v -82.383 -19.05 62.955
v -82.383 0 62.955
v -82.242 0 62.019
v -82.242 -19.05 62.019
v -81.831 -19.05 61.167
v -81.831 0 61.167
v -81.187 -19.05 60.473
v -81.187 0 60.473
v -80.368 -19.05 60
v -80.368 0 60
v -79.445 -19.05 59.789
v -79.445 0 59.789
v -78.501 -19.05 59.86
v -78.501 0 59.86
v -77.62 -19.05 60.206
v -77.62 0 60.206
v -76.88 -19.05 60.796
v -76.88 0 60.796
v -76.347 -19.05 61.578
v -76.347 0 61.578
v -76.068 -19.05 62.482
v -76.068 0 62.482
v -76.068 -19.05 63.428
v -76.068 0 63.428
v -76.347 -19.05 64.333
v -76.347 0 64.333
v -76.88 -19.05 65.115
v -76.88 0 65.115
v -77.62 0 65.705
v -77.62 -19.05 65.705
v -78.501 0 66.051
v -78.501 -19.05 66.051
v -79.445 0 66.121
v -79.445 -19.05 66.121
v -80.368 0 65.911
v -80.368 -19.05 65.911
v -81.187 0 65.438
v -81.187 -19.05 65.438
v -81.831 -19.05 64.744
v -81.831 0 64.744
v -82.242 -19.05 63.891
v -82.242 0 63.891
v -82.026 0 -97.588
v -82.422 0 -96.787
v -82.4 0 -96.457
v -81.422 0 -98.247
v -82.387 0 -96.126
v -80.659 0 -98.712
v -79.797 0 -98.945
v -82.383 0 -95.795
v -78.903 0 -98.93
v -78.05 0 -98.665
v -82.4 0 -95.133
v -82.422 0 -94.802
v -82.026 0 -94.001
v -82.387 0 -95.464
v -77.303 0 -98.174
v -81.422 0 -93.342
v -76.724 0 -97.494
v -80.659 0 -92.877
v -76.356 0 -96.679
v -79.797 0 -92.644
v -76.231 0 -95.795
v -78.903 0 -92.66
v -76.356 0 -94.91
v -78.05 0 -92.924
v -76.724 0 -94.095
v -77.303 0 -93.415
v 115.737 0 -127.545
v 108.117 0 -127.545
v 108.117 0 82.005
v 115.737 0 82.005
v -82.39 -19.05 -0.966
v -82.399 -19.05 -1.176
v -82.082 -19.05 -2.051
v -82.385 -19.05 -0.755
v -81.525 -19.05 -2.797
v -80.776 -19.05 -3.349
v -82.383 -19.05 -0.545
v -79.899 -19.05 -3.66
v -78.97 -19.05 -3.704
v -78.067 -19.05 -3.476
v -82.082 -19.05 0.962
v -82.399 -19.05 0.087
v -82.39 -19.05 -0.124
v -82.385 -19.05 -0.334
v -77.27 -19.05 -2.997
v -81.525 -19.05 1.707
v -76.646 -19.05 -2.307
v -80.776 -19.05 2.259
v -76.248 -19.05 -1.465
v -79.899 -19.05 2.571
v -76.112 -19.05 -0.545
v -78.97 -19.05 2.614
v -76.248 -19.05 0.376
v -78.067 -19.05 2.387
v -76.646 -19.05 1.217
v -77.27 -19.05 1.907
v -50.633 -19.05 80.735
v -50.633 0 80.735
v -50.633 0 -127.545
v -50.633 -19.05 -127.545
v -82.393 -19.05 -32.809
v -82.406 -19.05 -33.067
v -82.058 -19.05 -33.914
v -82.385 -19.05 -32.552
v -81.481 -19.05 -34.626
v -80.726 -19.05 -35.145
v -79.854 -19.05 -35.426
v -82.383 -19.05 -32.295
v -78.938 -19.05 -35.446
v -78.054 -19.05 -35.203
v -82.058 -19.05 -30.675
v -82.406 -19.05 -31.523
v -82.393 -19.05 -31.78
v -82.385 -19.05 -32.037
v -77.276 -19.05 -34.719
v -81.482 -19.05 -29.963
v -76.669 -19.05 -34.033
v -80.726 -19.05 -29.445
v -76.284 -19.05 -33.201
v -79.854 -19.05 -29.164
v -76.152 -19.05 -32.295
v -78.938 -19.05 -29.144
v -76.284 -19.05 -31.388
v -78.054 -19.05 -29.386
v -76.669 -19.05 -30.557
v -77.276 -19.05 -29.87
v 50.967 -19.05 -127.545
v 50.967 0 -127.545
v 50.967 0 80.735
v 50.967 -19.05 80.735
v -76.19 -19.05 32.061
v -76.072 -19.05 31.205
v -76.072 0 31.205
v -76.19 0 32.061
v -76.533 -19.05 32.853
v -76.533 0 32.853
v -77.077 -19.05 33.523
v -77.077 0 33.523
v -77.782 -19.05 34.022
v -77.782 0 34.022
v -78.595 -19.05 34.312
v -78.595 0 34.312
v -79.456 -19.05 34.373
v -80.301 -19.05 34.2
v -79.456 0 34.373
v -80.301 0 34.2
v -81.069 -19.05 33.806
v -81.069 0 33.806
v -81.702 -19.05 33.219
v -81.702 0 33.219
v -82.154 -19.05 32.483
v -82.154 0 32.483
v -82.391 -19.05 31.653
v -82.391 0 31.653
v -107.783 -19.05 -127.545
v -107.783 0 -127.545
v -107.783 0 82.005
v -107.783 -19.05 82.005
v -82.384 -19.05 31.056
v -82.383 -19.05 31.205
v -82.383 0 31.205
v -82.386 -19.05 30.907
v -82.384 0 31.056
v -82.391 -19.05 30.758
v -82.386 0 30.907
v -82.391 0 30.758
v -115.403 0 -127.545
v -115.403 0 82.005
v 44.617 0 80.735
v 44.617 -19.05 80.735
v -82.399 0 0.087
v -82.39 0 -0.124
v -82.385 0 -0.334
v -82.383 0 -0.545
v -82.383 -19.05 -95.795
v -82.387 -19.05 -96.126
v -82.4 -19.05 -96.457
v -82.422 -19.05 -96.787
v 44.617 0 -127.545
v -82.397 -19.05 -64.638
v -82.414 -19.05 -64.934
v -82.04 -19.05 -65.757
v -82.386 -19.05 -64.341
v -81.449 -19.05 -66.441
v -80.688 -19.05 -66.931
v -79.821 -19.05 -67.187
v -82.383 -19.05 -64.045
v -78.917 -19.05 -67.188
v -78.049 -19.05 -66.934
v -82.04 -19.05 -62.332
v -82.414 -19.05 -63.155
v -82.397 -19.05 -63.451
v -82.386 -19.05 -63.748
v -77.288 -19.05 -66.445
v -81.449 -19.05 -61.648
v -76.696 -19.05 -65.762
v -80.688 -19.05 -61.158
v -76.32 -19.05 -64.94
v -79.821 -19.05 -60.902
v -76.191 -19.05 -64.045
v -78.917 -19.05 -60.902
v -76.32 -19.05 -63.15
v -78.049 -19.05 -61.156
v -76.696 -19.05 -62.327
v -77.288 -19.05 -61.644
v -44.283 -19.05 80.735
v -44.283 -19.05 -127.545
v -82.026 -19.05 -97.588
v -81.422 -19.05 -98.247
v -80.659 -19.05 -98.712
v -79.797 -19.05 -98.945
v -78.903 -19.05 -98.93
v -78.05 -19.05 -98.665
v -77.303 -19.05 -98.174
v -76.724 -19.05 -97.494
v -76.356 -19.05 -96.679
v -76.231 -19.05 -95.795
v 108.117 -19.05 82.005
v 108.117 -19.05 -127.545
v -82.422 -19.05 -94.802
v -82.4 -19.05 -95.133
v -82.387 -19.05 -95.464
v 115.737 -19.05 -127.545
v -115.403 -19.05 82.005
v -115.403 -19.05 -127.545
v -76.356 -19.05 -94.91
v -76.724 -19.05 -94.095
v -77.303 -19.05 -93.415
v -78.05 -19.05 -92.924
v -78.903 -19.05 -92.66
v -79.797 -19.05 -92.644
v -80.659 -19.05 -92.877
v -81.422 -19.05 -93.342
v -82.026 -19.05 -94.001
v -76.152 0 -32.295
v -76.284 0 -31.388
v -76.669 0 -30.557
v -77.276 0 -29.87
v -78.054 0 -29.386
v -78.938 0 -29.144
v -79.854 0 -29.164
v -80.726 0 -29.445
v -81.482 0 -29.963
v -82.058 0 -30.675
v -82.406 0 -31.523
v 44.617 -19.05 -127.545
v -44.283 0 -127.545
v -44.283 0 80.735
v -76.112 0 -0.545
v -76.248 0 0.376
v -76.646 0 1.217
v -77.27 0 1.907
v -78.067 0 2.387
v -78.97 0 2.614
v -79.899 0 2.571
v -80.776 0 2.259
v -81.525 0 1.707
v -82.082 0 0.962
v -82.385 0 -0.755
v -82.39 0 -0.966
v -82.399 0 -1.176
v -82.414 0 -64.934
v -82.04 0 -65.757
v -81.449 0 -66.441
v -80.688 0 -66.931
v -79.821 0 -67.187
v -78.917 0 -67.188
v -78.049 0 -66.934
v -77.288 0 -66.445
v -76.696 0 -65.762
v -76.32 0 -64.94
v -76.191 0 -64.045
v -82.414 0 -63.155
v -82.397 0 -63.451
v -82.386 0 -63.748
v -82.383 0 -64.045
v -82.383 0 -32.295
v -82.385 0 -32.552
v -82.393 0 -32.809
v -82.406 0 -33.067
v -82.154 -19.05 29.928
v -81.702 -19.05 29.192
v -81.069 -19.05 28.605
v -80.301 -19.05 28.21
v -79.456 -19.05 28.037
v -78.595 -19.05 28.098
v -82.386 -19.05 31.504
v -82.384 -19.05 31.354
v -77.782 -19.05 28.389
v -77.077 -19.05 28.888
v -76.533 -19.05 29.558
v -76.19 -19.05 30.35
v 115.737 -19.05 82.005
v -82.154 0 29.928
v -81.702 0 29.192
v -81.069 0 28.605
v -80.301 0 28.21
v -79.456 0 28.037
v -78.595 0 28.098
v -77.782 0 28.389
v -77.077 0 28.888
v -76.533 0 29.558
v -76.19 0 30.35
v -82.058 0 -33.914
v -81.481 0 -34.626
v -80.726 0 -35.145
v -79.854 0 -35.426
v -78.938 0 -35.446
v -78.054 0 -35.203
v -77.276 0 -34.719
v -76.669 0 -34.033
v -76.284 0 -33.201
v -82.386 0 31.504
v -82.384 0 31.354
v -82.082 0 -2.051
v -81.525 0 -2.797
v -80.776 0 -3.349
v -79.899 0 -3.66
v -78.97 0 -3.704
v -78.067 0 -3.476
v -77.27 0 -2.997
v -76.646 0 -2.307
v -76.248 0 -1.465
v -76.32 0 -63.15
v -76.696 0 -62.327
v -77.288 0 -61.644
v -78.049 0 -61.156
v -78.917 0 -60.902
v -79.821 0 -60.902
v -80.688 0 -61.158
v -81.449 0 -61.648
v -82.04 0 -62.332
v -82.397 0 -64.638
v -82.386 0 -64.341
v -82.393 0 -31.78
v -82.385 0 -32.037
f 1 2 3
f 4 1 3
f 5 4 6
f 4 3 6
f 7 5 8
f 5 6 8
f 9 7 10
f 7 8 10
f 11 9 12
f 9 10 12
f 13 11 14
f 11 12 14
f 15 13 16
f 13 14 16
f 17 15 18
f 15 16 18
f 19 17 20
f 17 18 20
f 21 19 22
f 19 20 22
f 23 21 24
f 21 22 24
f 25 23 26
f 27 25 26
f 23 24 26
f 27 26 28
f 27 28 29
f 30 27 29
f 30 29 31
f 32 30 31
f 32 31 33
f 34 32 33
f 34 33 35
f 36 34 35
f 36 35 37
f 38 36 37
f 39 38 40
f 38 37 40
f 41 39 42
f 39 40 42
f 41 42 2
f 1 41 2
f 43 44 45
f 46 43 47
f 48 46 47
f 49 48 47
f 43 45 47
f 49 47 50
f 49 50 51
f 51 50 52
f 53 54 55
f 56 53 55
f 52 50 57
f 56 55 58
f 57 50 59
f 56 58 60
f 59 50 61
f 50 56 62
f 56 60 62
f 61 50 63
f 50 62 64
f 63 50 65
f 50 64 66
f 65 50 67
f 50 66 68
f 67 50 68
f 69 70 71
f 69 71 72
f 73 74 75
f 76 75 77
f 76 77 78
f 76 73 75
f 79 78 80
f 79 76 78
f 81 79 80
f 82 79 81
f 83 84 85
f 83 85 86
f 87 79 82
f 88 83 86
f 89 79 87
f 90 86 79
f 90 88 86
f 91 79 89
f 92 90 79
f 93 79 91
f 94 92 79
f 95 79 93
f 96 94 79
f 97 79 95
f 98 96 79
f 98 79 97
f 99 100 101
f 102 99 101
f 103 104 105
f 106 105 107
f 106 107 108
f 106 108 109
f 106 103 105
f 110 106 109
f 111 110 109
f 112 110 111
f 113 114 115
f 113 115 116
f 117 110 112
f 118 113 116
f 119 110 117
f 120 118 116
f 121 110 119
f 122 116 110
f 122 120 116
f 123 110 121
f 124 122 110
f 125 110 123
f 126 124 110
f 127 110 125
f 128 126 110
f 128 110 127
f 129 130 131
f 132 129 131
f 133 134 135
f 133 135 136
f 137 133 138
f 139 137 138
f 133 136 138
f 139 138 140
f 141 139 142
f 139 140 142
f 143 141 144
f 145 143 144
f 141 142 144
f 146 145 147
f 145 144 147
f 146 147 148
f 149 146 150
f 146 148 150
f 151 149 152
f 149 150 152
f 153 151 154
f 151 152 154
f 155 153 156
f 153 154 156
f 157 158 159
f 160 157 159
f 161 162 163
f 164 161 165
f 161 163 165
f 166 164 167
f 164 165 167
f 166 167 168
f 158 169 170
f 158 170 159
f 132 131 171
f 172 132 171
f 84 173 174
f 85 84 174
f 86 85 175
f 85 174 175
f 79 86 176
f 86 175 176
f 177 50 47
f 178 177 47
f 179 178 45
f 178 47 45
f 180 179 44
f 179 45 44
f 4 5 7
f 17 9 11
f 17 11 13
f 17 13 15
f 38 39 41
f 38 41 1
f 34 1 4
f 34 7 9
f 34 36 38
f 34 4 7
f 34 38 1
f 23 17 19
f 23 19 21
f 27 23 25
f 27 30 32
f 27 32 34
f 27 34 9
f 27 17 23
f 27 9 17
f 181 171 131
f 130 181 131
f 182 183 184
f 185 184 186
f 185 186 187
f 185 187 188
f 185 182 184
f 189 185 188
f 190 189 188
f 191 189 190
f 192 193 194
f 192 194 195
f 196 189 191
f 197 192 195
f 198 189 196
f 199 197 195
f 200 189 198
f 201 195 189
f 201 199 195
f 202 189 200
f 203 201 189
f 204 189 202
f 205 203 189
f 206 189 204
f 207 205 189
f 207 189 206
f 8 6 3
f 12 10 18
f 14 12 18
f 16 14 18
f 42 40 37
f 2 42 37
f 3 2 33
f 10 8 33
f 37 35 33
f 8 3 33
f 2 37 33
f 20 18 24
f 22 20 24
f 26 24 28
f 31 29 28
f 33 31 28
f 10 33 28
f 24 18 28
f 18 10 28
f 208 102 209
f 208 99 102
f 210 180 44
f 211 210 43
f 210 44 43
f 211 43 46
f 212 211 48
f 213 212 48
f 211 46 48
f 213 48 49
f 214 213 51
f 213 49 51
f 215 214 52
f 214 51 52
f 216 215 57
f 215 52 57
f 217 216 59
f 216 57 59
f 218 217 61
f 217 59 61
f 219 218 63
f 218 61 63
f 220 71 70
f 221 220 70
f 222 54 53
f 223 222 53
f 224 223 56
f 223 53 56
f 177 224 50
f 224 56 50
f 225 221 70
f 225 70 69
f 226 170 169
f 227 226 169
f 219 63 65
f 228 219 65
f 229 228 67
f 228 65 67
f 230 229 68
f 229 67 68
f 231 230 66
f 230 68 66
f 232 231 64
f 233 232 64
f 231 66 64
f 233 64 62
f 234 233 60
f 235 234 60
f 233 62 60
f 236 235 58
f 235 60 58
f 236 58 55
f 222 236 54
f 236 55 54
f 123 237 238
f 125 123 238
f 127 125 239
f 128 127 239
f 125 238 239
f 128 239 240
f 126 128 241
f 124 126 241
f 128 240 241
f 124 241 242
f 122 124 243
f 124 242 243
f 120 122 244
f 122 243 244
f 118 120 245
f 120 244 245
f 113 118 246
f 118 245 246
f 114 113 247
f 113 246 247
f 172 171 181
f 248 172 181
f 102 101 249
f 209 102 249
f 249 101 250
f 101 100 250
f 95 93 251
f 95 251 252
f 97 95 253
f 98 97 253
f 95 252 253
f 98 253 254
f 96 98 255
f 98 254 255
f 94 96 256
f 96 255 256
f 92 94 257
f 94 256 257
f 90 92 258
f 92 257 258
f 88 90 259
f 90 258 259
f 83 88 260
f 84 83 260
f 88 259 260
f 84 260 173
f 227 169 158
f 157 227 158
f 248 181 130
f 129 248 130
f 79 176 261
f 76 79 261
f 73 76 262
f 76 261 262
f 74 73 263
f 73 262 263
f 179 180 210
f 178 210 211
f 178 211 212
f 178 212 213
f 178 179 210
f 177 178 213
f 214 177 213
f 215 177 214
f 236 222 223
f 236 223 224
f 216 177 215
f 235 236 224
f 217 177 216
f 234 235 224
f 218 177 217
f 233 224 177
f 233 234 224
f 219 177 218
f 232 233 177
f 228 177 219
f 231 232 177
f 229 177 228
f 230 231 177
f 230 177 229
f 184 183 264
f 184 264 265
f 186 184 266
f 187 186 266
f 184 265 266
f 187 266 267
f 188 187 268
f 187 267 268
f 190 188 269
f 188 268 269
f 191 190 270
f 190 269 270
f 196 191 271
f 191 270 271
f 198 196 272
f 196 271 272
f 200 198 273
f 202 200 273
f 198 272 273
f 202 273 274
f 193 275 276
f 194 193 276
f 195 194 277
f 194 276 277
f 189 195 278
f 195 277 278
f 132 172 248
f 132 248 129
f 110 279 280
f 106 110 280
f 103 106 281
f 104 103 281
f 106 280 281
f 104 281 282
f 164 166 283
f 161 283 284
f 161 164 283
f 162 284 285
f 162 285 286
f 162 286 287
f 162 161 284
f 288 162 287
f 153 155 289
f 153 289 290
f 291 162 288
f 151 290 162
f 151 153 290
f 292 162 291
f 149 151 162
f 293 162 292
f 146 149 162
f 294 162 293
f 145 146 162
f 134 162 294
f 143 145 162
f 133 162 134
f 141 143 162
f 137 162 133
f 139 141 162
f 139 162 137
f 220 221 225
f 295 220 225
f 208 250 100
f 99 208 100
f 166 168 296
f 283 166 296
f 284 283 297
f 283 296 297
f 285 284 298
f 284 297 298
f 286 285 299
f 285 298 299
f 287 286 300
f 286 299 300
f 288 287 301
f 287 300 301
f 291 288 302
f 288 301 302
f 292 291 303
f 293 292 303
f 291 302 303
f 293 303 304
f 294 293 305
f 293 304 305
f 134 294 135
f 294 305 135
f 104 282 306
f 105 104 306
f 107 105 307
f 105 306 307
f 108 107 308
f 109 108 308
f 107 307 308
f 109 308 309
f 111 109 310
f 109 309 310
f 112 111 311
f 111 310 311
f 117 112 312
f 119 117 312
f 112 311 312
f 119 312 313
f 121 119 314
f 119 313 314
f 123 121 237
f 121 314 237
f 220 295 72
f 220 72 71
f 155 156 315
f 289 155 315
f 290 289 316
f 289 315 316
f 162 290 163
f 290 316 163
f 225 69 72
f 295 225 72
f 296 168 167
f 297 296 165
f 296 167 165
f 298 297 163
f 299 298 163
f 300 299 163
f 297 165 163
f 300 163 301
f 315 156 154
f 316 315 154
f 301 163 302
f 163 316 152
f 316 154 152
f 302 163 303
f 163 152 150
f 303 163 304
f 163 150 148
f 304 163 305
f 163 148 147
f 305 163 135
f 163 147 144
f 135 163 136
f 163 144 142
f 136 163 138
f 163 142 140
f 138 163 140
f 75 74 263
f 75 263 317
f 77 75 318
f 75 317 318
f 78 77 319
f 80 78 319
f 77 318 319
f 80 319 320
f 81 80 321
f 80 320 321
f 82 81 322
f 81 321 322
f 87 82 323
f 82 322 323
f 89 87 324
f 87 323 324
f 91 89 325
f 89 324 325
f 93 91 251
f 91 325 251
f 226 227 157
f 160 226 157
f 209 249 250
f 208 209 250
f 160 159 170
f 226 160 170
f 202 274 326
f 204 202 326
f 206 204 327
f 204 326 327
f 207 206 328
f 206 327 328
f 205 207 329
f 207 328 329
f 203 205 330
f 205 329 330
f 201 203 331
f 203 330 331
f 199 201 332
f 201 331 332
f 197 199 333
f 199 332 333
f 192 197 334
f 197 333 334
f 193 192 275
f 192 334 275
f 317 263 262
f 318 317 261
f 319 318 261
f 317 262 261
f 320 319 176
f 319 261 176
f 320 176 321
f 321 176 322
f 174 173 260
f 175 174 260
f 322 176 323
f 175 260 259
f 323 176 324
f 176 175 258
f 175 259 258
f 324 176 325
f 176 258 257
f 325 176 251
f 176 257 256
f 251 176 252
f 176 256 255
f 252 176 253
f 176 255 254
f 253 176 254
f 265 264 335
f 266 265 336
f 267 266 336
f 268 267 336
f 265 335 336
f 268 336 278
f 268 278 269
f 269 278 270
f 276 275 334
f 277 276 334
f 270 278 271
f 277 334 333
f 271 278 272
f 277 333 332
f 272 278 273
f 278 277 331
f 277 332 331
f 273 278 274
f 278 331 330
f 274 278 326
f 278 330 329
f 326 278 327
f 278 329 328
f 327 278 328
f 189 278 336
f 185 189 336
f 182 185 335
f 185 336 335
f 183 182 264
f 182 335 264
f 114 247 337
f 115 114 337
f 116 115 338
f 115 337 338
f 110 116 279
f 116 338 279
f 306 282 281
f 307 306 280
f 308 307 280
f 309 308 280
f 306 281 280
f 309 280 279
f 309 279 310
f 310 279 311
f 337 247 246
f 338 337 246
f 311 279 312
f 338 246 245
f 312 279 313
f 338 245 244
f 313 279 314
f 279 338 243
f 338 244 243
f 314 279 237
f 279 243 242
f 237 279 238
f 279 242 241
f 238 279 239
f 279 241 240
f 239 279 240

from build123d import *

# Parameters (mm, degrees)
F1_DEPTH = 19.05


with BuildPart() as f1:
    # F0 (on Front) → F1 (new body)
    with BuildSketch(Plane.XZ):
        Polygon((108.117165637, -95.7947247652), (108.117165637, -127.5447247652), (115.737165637, -127.5447247652), (115.737165637, 82.0052752348), (108.117165637, 82.0052752348), (108.117165637, 62.9552752348), (108.117165637, 31.2052752348), (108.117165637, -0.5447247652), (108.117165637, -32.2947247652), (108.117165637, -64.0447247652), align=None)
    extrude(amount=F1_DEPTH)


with BuildPart() as f1b:
    # F0 (on Front) → F1, piece 2 (new body)
    with BuildSketch(Plane.XZ):
        Polygon((50.967165637, 31.2052752348), (50.967165637, 62.9552752348), (50.967165637, 80.7352752348), (44.617165637, 80.7352752348), (44.617165637, 62.9552752348), (44.617165637, 31.2052752348), (44.617165637, -0.5447247652), (44.617165637, -32.2947247652), (44.617165637, -64.0447247652), (44.617165637, -95.7947247652), (44.617165637, -127.5447247652), (50.967165637, -127.5447247652), (50.967165637, -95.7947247652), (50.967165637, -64.0447247652), (50.967165637, -32.2947246679), (50.967165637, -0.544724715), align=None)
    extrude(amount=F1_DEPTH)


with BuildPart() as f1c:
    # F0 (on Front) → F1, piece 3 (new body)
    with BuildSketch(Plane.XZ):
        Polygon((-50.632834363, -127.5447247652), (-44.282834363, -127.5447247652), (-44.282834363, -95.7947247051), (-44.282834363, -64.0447247652), (-44.282834363, -32.2947247652), (-44.282834363, -0.5447248178), (-44.282834363, 31.2052752348), (-44.282834363, 62.9552752348), (-44.282834363, 80.7352752348), (-50.632834363, 80.7352752348), (-50.632834363, 62.9552752348), (-50.632834363, 31.2052752348), (-50.632834363, -0.5447247652), (-50.632834363, -32.2947247652), (-50.632834363, -64.0447247652), (-50.632834363, -95.7947247652), align=None)
    extrude(amount=F1_DEPTH)


with BuildPart() as f1d:
    # F0 (on Front) → F1, piece 4 (new body)
    with BuildSketch(Plane.XZ):
        Polygon((-115.402834363, -127.5447247652), (-107.782834363, -127.5447247652), (-107.782834363, -95.7947247652), (-107.782834363, -64.0447247652), (-107.782834363, -32.2947247652), (-107.782834363, -0.5447247652), (-107.782834363, 31.2052752348), (-107.782834363, 62.9552752348), (-107.782834363, 82.0052752348), (-115.402834363, 82.0052752348), align=None)
    extrude(amount=F1_DEPTH)


with BuildPart() as f1e:
    # F0 (on Front) → F1, piece 5 (new body)
    with BuildSketch(Plane.XZ):
        with BuildLine():
            ThreePointArc((-76.2307250385, -95.7946014243), (-78.903232835, -92.6596171204), (-82.4216709191, -94.8022832066))
            ThreePointArc((-82.4216709191, -94.8022832066), (-82.3925472162, -95.2981241899), (-82.382834363, -95.7947247652))
            ThreePointArc((-82.382834363, -95.7947247652), (-82.3925433095, -96.2912254986), (-82.4216553044, -96.7869670983))
            ThreePointArc((-82.4216553044, -96.7869670983), (-78.9032081703, -98.9295817747), (-76.2307250385, -95.7946014243))
        make_face()
    extrude(amount=F1_DEPTH)


with BuildPart() as f1f:
    # F0 (on Front) → F1, piece 6 (new body)
    with BuildSketch(Plane.XZ):
        with BuildLine():
            ThreePointArc((-76.1911469034, -64.0446260925), (-78.9169169837, -60.901567474), (-82.4140240557, -63.1552050085))
            ThreePointArc((-82.4140240557, -63.1552050085), (-82.3906341813, -63.5996915658), (-82.382834363, -64.0447247652))
            ThreePointArc((-82.382834363, -64.0447247652), (-82.3906313876, -64.4896782803), (-82.4140128875, -64.9340854468))
            ThreePointArc((-82.4140128875, -64.9340854468), (-78.9168972509, -67.1876818906), (-76.1911469034, -64.0446260925))
        make_face()
    extrude(amount=F1_DEPTH)


with BuildPart() as f1g:
    # F0 (on Front) → F1, piece 7 (new body)
    with BuildSketch(Plane.XZ):
        with BuildLine():
            ThreePointArc((-76.1515687683, -32.2946507607), (-78.9377075307, -29.1435538187), (-82.4063164457, -31.5227833863))
            ThreePointArc((-82.4063164457, -31.5227833863), (-82.3887062411, -31.9085755387), (-82.382834363, -32.2947247652))
            ThreePointArc((-82.382834363, -32.2947247652), (-82.3887044276, -32.6808143696), (-82.4063091949, -33.0665470651))
            ThreePointArc((-82.4063091949, -33.0665470651), (-78.9376927305, -35.4457458762), (-76.1515687683, -32.2946507607))
        make_face()
    extrude(amount=F1_DEPTH)


with BuildPart() as f1h:
    # F0 (on Front) → F1, piece 8 (new body)
    with BuildSketch(Plane.XZ):
        with BuildLine():
            ThreePointArc((-76.1119906332, -0.5446754288), (-78.9696355559, 2.6144242459), (-82.398548589, 0.0868561123))
            ThreePointArc((-82.398548589, 0.0868561123), (-82.3867635273, -0.228836596), (-82.382834363, -0.5447247652))
            ThreePointArc((-82.382834363, -0.5447247652), (-82.3867625407, -0.8605732798), (-82.398544644, -1.1762264071))
            ThreePointArc((-82.398544644, -1.1762264071), (-78.9696256888, -3.7037741123), (-76.1119906332, -0.5446754288))
        make_face()
    extrude(amount=F1_DEPTH)


with BuildPart() as f1i:
    # F0 (on Front) → F1, piece 9 (new body)
    with BuildSketch(Plane.XZ):
        with BuildLine():
            ThreePointArc((-76.0724124981, 31.205299903), (-79.0231130659, 34.3723671212), (-82.3907210113, 31.6527779367))
            ThreePointArc((-82.3907210113, 31.6527779367), (-82.3848061781, 31.429061331), (-82.382834363, 31.2052752348))
            ThreePointArc((-82.382834363, 31.2052752348), (-82.3848058295, 30.9815089194), (-82.3907196171, 30.757812076))
            ThreePointArc((-82.3907196171, 30.757812076), (-79.0231081323, 28.0382330342), (-76.0724124981, 31.205299903))
        make_face()
    extrude(amount=F1_DEPTH)


with BuildPart() as f1j:
    # F0 (on Front) → F1, piece 10 (new body)
    with BuildSketch(Plane.XZ):
        with BuildLine():
            ThreePointArc((-76.032834363, 62.9552752348), (-79.207834363, 66.1302752348), (-82.382834363, 62.9552752348))
            ThreePointArc((-82.382834363, 62.9552752348), (-79.207834363, 59.7802752348), (-76.032834363, 62.9552752348))
        make_face()
    extrude(amount=F1_DEPTH)


solid = Compound([f1.part, f1b.part, f1c.part, f1d.part, f1e.part, f1f.part, f1g.part, f1h.part, f1i.part, f1j.part])
